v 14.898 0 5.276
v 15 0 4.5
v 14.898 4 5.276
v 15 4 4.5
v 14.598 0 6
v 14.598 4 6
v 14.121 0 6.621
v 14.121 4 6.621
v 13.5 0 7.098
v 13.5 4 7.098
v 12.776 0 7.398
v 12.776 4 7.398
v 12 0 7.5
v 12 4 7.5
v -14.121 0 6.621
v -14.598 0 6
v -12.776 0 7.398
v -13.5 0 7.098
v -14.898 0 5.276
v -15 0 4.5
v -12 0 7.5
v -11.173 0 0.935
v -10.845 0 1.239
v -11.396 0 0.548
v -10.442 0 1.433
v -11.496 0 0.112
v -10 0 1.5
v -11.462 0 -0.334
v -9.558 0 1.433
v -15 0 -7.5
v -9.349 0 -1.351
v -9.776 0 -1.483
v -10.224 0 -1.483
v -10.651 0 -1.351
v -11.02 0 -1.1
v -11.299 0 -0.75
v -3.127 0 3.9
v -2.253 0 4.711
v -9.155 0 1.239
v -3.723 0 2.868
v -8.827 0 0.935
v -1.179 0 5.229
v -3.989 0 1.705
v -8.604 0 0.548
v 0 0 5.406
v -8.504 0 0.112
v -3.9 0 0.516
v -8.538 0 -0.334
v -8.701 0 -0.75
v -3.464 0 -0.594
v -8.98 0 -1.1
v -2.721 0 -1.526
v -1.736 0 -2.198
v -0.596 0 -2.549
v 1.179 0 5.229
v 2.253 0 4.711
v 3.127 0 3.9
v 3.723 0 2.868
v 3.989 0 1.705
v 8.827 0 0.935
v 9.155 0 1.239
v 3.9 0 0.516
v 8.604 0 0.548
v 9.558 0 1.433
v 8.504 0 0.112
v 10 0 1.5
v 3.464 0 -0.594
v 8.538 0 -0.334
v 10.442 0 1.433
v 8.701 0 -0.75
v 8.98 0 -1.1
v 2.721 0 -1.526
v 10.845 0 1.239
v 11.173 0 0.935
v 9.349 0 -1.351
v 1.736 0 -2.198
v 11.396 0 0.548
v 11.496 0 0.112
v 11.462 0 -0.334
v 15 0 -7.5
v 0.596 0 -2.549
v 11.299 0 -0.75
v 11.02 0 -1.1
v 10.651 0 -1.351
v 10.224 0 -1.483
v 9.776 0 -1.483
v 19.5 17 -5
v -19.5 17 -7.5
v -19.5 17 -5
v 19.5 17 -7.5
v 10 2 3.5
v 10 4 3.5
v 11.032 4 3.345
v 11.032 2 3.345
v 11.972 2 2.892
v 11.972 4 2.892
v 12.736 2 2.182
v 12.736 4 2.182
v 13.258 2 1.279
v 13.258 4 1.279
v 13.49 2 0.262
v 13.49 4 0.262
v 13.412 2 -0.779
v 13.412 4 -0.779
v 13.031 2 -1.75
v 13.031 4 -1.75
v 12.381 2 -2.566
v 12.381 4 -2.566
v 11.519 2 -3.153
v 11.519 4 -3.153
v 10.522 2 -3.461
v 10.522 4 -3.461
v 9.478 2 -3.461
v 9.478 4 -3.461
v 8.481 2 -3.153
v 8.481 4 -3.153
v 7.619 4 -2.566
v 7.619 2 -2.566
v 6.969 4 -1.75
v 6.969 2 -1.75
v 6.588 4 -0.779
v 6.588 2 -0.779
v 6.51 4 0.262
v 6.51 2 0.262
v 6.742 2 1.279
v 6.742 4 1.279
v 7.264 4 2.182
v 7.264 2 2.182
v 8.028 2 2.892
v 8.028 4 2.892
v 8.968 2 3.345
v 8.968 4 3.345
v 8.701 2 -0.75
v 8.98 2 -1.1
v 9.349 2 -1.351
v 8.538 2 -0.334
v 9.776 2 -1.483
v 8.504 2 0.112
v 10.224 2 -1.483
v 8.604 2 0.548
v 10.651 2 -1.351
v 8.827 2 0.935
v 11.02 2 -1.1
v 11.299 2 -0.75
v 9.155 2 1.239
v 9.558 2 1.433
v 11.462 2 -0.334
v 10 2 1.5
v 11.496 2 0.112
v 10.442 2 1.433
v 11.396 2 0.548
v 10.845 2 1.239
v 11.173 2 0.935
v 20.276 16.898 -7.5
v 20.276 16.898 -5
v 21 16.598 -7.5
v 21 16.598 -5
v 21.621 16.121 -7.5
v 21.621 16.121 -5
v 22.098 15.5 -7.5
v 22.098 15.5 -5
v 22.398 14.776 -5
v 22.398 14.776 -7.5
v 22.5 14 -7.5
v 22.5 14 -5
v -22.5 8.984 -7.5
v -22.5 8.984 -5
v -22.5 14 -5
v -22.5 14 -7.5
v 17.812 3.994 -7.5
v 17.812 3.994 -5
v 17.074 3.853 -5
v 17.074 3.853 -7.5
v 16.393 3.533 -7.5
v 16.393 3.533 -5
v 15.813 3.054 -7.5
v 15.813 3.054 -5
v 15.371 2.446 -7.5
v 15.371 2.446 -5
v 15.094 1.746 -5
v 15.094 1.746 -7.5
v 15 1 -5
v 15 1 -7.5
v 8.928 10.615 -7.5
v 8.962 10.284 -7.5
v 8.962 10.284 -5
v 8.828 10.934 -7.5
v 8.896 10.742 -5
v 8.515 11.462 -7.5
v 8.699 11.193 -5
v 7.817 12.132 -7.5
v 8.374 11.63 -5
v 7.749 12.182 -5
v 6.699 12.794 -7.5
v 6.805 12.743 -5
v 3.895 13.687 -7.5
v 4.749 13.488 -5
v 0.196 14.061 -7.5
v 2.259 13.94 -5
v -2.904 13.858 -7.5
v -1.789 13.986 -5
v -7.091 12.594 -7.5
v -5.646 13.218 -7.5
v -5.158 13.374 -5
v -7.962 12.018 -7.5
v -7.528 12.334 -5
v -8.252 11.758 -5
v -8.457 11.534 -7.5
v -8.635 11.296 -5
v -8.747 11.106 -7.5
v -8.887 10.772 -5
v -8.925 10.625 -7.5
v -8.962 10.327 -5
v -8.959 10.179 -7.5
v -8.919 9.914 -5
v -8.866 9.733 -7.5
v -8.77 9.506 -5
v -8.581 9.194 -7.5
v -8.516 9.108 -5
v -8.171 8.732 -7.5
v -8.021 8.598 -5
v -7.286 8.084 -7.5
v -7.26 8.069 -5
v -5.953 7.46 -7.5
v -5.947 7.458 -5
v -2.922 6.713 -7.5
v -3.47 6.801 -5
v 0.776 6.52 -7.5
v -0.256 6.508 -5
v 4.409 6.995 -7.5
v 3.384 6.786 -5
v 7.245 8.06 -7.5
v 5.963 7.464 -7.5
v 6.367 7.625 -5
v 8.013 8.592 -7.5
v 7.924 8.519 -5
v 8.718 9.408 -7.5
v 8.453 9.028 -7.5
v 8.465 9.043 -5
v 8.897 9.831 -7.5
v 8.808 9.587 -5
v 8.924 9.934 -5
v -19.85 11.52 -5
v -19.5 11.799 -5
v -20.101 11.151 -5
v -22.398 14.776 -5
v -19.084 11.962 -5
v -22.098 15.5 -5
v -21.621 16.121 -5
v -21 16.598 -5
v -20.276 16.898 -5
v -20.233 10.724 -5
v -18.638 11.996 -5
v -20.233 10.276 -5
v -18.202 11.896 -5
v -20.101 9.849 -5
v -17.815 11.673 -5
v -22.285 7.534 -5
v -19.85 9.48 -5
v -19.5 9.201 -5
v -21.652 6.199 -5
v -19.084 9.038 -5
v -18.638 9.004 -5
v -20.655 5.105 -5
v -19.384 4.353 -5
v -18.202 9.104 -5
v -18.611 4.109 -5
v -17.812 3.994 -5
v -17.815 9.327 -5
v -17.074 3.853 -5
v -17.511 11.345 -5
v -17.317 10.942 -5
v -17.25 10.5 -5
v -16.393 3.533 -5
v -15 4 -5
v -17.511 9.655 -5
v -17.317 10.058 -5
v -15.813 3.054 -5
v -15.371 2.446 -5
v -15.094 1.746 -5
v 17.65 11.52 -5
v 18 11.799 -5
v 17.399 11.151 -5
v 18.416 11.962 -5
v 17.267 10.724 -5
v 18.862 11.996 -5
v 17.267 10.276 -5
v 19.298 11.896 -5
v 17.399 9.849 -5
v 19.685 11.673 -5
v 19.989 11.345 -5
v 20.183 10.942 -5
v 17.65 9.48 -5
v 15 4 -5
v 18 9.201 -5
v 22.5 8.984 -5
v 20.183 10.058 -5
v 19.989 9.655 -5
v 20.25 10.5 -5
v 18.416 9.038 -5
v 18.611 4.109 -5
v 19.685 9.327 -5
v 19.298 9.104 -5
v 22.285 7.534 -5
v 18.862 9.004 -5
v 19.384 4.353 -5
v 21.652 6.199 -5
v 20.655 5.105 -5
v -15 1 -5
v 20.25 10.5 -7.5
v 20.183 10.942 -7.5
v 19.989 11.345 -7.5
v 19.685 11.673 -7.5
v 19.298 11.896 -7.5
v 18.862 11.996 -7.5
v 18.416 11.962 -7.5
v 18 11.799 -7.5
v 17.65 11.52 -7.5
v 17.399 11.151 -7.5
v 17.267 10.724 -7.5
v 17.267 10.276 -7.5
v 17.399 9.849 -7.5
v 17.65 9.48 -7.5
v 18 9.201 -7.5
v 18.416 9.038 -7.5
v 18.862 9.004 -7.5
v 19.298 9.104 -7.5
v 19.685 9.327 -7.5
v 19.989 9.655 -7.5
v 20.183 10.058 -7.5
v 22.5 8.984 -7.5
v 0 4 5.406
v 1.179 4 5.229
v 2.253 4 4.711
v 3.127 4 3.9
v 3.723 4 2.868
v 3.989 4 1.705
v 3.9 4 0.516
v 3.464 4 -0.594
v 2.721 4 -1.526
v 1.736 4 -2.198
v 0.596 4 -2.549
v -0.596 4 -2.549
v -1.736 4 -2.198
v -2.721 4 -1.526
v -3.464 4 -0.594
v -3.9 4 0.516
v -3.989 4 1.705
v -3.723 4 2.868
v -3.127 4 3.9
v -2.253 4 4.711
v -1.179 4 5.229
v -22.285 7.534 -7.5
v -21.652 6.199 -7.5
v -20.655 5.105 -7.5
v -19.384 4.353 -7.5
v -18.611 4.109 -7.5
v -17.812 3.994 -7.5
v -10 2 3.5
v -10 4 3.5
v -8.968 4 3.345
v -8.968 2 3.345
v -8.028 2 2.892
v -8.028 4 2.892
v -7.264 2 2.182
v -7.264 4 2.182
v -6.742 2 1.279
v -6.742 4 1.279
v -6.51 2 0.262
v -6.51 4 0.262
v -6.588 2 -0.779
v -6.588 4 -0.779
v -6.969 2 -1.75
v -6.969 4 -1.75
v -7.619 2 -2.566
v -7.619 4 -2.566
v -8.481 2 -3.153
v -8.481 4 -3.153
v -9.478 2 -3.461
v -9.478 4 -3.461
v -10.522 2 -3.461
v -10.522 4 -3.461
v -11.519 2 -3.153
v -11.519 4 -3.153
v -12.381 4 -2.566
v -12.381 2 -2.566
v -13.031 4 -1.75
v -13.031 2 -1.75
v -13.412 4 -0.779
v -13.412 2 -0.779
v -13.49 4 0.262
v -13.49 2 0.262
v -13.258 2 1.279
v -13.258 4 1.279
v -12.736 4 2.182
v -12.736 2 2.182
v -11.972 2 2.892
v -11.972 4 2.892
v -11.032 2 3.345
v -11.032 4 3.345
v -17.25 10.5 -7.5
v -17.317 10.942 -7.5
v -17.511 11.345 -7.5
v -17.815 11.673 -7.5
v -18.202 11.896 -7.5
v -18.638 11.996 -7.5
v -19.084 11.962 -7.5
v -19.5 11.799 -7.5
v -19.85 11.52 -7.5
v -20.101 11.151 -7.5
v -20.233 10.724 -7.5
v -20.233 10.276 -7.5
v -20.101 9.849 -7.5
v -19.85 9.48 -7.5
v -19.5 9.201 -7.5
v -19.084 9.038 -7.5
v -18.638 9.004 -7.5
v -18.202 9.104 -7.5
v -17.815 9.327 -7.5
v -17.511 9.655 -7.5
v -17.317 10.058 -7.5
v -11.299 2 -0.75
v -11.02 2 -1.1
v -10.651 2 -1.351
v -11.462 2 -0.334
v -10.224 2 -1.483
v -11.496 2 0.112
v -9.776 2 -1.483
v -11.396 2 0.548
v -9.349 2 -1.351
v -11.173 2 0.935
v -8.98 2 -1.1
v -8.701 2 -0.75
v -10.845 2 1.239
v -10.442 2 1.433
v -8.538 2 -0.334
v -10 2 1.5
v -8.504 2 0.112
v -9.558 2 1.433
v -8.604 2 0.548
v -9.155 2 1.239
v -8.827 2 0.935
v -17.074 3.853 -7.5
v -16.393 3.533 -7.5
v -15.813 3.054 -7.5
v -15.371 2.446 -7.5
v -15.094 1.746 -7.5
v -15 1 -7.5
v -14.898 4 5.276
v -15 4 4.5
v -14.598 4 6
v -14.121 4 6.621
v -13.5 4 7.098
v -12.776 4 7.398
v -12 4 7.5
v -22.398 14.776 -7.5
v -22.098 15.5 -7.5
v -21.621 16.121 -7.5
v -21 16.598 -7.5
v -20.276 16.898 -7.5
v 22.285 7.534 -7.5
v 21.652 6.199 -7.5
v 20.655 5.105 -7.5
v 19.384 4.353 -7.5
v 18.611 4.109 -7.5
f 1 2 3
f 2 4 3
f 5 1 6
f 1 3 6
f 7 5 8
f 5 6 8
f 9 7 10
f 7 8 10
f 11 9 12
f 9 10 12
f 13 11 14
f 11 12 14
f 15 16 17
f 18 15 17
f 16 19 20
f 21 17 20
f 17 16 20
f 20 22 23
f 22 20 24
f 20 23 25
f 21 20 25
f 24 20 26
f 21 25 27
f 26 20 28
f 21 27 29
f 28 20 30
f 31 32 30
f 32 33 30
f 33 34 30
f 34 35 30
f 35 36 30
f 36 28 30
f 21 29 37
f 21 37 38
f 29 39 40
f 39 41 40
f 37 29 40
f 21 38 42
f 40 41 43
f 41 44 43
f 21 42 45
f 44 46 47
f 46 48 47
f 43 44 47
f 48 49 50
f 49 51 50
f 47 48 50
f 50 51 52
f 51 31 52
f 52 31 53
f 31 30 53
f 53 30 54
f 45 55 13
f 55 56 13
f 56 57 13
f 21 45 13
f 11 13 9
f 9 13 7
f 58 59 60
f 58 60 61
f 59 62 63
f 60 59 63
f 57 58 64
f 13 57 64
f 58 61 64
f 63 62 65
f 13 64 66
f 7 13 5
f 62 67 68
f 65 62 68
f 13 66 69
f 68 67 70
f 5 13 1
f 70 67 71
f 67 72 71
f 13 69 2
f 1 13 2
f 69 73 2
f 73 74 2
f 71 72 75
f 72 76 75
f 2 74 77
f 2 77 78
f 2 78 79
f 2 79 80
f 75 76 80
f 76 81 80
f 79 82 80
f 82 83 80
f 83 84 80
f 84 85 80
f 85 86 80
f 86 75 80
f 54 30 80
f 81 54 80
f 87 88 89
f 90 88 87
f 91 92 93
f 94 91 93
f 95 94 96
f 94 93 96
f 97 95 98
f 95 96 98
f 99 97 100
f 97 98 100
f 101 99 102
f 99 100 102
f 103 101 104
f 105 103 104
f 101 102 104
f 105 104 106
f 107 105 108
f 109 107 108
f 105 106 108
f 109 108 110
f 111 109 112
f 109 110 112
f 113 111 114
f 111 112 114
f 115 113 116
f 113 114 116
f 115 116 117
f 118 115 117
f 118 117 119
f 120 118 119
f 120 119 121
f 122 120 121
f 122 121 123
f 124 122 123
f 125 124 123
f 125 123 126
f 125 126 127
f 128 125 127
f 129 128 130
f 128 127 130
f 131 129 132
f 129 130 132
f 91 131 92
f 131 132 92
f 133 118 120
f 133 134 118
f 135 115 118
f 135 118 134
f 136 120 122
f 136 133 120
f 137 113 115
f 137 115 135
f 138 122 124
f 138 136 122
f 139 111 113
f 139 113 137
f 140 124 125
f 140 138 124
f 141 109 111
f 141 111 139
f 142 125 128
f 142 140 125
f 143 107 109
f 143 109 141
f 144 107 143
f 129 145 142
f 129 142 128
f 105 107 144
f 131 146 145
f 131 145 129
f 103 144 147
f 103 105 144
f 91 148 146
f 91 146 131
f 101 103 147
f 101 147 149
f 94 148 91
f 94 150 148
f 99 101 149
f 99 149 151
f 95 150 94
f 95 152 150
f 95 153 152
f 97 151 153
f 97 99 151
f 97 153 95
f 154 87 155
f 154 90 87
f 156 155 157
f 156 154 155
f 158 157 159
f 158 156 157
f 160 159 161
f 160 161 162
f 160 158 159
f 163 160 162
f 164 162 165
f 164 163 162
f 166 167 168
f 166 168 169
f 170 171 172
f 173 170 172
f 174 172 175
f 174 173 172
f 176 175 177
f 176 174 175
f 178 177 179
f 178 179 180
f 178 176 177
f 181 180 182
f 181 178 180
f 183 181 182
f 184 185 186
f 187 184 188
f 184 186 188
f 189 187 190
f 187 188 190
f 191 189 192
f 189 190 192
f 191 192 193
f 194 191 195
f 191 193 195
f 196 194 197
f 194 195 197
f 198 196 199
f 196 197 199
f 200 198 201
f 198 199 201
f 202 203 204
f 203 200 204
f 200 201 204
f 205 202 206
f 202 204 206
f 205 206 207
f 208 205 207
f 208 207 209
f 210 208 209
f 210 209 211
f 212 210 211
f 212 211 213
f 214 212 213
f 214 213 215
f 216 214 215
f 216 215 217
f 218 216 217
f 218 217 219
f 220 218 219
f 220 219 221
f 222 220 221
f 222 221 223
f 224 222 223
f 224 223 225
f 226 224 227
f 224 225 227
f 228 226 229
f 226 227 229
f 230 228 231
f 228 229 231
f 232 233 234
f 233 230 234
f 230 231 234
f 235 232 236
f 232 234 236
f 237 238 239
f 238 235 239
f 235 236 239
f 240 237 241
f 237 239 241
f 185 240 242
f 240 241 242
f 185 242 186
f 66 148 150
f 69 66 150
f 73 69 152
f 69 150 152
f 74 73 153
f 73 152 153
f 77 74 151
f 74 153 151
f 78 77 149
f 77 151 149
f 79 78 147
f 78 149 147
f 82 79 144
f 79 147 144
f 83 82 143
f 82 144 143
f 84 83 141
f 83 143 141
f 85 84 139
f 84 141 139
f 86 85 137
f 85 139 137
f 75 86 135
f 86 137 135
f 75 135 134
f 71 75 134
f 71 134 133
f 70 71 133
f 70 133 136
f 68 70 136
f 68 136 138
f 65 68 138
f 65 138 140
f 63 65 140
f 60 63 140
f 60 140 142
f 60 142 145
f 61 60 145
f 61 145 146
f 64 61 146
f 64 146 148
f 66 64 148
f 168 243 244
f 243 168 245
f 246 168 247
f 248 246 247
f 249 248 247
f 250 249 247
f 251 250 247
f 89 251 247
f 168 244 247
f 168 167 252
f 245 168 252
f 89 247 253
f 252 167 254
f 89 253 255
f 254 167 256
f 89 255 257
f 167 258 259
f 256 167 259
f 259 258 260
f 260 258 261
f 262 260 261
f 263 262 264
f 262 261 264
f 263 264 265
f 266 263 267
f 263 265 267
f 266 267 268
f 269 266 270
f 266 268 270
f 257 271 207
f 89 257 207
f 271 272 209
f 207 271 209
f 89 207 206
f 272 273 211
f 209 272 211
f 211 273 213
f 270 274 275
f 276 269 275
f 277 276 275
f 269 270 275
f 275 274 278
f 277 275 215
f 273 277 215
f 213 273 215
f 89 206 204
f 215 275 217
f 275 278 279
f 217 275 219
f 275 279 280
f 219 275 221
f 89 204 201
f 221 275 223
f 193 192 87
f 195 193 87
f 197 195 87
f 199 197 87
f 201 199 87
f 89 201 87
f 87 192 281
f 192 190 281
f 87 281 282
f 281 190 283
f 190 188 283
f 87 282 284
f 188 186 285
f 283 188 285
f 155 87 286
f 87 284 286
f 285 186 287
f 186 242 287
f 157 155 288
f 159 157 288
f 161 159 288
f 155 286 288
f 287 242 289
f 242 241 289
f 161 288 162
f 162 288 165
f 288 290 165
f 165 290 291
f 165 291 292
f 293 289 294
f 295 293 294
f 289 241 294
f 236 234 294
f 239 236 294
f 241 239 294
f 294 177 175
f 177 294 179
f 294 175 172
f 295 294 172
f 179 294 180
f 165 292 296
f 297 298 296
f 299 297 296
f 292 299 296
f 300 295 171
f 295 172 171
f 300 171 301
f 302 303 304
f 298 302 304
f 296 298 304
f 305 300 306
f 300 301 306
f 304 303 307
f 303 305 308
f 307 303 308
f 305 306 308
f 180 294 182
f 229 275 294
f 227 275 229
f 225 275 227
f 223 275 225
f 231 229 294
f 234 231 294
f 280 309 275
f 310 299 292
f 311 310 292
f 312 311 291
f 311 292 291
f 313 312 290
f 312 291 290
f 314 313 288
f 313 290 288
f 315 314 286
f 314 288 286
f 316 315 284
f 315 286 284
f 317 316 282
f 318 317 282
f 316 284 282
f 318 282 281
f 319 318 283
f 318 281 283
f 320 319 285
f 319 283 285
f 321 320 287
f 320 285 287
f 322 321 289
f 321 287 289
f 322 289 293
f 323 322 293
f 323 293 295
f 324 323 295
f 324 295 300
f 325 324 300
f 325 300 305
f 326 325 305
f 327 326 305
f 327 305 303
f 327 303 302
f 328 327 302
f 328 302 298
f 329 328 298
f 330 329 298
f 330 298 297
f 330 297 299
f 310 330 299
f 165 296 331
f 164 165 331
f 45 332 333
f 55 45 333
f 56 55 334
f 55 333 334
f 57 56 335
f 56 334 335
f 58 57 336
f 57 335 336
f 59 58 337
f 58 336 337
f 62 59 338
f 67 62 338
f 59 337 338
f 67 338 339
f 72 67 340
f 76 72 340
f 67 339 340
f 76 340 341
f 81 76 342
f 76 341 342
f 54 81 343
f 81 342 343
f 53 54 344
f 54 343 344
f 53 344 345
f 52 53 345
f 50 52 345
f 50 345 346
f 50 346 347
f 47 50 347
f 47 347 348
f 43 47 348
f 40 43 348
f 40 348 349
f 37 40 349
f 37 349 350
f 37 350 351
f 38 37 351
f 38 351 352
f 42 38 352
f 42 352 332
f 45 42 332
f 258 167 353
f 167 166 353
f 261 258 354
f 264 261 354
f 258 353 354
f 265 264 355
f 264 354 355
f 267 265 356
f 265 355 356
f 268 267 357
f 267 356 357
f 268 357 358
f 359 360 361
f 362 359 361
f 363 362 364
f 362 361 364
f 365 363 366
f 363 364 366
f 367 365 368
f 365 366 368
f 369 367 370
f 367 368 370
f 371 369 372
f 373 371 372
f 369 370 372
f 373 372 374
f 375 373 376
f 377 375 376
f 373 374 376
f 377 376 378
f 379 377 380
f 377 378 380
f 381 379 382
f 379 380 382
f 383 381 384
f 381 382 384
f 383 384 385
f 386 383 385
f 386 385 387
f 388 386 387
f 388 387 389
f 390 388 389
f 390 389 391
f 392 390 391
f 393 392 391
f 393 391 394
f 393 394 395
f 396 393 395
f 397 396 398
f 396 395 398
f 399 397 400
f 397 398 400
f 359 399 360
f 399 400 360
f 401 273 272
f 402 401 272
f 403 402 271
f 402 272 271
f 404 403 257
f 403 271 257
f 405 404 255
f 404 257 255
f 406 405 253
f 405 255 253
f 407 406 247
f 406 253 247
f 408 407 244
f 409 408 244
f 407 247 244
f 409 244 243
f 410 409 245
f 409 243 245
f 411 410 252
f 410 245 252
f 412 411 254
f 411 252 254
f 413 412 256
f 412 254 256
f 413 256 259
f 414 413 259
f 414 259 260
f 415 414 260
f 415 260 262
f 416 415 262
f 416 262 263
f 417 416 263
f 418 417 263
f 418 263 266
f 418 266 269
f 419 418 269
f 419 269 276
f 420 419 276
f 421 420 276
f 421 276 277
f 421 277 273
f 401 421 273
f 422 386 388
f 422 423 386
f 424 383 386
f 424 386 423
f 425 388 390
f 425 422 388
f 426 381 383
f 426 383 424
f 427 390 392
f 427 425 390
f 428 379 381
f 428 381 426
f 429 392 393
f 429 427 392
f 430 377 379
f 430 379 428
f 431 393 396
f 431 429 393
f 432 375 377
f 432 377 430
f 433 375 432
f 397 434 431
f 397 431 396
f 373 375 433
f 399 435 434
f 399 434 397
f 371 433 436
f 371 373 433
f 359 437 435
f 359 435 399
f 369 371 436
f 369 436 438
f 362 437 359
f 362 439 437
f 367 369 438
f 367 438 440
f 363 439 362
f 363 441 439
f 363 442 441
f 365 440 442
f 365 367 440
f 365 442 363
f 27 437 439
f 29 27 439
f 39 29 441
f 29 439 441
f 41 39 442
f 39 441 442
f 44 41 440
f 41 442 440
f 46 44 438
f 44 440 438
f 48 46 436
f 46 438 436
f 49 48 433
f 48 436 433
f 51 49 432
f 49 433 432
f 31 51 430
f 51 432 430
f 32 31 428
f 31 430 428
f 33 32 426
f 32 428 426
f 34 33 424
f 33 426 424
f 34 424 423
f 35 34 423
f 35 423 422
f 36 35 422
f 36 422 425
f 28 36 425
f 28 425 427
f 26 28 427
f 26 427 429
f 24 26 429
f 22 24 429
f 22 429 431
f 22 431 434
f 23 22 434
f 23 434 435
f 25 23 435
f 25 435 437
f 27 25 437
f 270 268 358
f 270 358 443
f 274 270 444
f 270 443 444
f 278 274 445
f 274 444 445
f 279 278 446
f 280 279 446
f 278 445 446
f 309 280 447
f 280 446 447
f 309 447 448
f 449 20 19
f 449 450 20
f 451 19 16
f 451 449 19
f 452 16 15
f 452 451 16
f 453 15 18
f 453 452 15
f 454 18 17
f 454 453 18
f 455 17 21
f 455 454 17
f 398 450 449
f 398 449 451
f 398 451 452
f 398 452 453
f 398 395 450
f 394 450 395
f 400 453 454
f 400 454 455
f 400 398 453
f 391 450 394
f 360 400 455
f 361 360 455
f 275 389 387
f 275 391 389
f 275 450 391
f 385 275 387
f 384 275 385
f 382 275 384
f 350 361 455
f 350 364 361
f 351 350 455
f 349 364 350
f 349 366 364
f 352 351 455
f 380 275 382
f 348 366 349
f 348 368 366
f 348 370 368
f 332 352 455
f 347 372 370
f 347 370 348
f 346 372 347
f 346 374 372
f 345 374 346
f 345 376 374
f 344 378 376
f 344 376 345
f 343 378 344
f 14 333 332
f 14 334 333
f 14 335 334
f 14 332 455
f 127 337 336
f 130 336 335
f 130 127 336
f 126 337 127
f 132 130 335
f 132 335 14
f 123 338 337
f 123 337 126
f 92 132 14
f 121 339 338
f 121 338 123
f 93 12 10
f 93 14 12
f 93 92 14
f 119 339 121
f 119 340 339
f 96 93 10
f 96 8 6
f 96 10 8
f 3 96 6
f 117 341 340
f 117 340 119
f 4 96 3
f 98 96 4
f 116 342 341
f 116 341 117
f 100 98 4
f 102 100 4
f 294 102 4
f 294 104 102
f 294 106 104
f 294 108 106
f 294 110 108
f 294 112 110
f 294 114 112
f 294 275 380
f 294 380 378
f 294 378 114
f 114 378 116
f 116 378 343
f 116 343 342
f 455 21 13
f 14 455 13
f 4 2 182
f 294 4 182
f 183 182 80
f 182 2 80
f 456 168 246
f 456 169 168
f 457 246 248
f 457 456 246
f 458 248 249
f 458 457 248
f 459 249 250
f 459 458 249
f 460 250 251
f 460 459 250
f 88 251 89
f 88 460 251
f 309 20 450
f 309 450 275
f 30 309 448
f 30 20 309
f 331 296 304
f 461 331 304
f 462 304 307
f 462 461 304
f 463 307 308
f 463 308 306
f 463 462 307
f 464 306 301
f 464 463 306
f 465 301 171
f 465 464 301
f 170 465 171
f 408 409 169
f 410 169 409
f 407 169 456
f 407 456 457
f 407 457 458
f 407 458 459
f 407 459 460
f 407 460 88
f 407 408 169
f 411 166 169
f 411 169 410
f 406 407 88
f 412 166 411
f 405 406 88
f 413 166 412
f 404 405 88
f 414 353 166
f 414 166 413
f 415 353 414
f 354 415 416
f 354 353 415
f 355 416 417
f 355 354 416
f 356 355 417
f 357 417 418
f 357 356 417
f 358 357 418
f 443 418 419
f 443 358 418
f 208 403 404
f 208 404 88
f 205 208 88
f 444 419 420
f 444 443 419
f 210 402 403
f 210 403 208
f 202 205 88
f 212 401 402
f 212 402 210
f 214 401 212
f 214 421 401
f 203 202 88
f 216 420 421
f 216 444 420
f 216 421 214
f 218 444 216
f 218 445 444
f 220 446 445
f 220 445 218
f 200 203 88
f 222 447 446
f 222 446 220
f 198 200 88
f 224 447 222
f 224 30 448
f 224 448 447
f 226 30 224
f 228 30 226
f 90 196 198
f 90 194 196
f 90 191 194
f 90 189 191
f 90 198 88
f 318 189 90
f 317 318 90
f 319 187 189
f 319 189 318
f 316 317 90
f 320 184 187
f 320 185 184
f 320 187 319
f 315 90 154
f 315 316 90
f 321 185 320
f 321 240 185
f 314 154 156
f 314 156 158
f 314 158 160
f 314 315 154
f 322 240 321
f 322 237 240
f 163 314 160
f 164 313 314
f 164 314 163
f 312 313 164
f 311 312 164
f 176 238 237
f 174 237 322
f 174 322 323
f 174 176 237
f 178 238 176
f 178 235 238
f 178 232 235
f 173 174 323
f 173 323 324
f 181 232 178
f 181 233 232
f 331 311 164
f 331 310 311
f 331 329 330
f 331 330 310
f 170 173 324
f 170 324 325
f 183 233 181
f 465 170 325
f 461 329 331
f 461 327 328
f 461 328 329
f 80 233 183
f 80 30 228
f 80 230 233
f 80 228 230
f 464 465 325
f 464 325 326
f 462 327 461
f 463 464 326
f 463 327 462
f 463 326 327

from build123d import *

# Parameters (mm, degrees)
SKETCH_1_W          = 30
SKETCH_1_H          = 15
EXTRUDE_1_DEPTH     = 4
SKETCH_2_W          = 45
SKETCH_2_H          = 2.5
EXTRUDE_2_DEPTH     = 13
SKETCH_3_R          = 1.5
CUT_EXTRUDE_1_DEPTH = 25
FILLET_1_R          = 3
SKETCH_4_R          = 1.5
CUT_EXTRUDE_2_DEPTH = 25
SKETCH_5_R          = 3.5
CUT_EXTRUDE_3_DEPTH = 2
FILLET_2_R          = 5
SKETCH_6_RX         = 8.962094073
SKETCH_6_RY         = 3.777931928
CUT_EXTRUDE_4_DEPTH = 10
SKETCH_7_R          = 4
CUT_EXTRUDE_5_DEPTH = 10


with BuildPart() as part:
    # 草图1 → 凸台-拉伸1 (new body)
    with BuildSketch(Plane(origin=(0, 0, 0), x_dir=(1, 0, 0), z_dir=(0, 1, 0))):
        Rectangle(SKETCH_1_W, SKETCH_1_H)
    extrude(amount=EXTRUDE_1_DEPTH)

    # 草图2 → 凸台-拉伸2 (add)
    with BuildSketch(Plane(origin=(0, 4, 0), x_dir=(1, 0, 0), z_dir=(0, 1, 0))):
        with Locations((0, 6.25)):
            Rectangle(SKETCH_2_W, SKETCH_2_H)
    extrude(amount=EXTRUDE_2_DEPTH)

    # 草图3 → 切除-拉伸1 (cut)
    with BuildSketch(Plane.XY.offset(-5)):
        with Locations((18.75, 10.5)):
            Circle(SKETCH_3_R)
        with Locations((-18.75, 10.5)):
            Circle(SKETCH_3_R)
    extrude(amount=-CUT_EXTRUDE_1_DEPTH, mode=Mode.SUBTRACT)

    # 圆角1
    fillet_1_edges = [part.edges().sort_by_distance(p)[0] for p in [
        (-15, 2, 7.5),
        (15, 2, 7.5),
        (15, 4, -6.25),
        (-15, 4, -6.25),
        (-22.5, 17, -6.25),
        (22.5, 17, -6.25),
    ]]
    fillet(fillet_1_edges, radius=FILLET_1_R)

    # 草图4 → 切除-拉伸2 (cut)
    with BuildSketch(Plane(origin=(0, 4, 0), x_dir=(1, 0, 0), z_dir=(0, 1, 0))):
        with Locations(Location((10, 0, 0), (0, 0, 270))):
            Circle(SKETCH_4_R)
        with Locations(Location((-10, 0, 0), (0, 0, 270))):
            Circle(SKETCH_4_R)
    extrude(amount=-CUT_EXTRUDE_2_DEPTH, mode=Mode.SUBTRACT)

    # 草图5 → 切除-拉伸3 (cut)
    with BuildSketch(Plane(origin=(0, 4, 0), x_dir=(1, 0, 0), z_dir=(0, 1, 0))):
        with Locations(Location((10, 0, 0), (0, 0, 270))):
            Circle(SKETCH_5_R)
        with Locations(Location((-10, 0, 0), (0, 0, 270))):
            Circle(SKETCH_5_R)
    extrude(amount=-CUT_EXTRUDE_3_DEPTH, mode=Mode.SUBTRACT)

    # 圆角2
    fillet_2_edges = [part.edges().sort_by_distance(p)[0] for p in [
        (-22.5, 4, -6.25),
        (22.5, 4, -6.25),
    ]]
    fillet(fillet_2_edges, radius=FILLET_2_R)

    # 草图6 → 切除-拉伸4 (cut)
    with BuildSketch(Plane.XY.offset(-5)):
        with Locations((0, 10.28402341)):
            Ellipse(SKETCH_6_RX, SKETCH_6_RY)
    extrude(amount=-CUT_EXTRUDE_4_DEPTH, mode=Mode.SUBTRACT)

    # 草图7 → 切除-拉伸5 (cut)
    with BuildSketch(Plane(origin=(0, 4, 0), x_dir=(1, 0, 0), z_dir=(0, 1, 0))):
        with Locations(Location((0, -1.406230218, 0), (0, 0, 270))):
            Circle(SKETCH_7_R)
    extrude(amount=-CUT_EXTRUDE_5_DEPTH, mode=Mode.SUBTRACT)


solid = part.part
